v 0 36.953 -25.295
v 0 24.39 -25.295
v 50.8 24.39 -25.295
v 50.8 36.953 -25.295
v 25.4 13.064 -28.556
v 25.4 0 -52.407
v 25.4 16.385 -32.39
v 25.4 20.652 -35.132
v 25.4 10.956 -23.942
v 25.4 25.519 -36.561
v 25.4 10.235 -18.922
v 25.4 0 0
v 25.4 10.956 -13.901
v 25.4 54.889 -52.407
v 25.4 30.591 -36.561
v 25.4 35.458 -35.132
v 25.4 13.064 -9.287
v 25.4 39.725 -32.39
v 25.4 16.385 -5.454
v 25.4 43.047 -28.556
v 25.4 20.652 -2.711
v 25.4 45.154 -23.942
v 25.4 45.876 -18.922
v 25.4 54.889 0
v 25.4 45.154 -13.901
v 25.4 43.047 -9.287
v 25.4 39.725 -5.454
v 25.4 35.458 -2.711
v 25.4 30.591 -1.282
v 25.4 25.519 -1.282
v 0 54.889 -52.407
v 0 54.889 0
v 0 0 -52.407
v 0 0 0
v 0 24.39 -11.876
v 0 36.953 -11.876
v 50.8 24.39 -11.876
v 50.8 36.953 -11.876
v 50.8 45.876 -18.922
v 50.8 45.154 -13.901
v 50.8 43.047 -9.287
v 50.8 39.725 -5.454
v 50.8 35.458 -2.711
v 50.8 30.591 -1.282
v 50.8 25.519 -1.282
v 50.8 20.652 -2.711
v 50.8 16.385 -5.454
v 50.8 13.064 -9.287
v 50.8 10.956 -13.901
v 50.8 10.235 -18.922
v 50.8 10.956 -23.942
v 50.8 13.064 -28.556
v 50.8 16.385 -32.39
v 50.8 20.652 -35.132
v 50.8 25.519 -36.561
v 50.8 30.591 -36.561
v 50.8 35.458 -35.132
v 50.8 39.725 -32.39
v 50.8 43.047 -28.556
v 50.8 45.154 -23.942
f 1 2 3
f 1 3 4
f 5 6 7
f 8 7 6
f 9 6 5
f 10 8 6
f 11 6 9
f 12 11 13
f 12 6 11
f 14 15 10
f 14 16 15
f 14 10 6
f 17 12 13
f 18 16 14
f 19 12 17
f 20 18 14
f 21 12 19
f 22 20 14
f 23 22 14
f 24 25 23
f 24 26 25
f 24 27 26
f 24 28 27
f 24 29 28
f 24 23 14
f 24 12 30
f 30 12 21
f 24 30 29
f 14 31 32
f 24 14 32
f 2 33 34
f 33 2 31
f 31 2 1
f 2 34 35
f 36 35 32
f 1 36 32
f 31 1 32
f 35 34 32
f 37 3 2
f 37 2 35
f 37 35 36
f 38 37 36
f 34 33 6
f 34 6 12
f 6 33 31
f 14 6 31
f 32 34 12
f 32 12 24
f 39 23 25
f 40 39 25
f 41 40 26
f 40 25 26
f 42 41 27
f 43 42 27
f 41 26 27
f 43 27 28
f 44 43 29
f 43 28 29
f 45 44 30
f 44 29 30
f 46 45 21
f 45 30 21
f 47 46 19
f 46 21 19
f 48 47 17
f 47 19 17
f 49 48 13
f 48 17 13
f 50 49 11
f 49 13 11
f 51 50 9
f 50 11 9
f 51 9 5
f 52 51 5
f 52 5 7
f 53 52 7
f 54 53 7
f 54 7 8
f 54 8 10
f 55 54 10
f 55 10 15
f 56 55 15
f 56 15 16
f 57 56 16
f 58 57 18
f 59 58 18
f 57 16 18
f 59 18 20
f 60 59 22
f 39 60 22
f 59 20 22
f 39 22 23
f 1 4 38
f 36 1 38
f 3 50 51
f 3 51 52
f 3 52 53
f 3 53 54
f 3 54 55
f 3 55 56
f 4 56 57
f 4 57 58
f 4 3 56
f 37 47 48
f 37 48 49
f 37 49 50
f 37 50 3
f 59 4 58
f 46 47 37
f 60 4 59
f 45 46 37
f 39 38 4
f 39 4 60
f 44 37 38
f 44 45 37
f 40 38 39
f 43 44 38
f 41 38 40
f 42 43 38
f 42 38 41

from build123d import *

# Parameters (mm, degrees)
F0_W     = 54.889154
F0_H     = 52.407466
F1_DEPTH = 25.4
F2_R     = 17.820704
F3_DEPTH = 25.4
F4_W     = 12.562469
F4_H     = 13.418828
F5_DEPTH = 50.801


with BuildPart() as f1:
    # F0 (on Right) → F1 (new body)
    with BuildSketch(Plane.YZ):
        with Locations((27.444577, -26.203733)):
            Rectangle(F0_W, F0_H)
    extrude(amount=F1_DEPTH)

    # F2 (on face) → F3 (join)
    with BuildSketch(Plane.YZ.offset(25.4)):
        with Locations((28.055245, -18.92175)):
            Circle(F2_R)
    extrude(amount=F3_DEPTH)

    # F4 (on face) → F5 (cut, through all)
    with BuildSketch(Plane.YZ.offset(50.8)):
        with Locations((30.671432, -18.585598)):
            Rectangle(F4_W, F4_H)
    extrude(amount=-F5_DEPTH, mode=Mode.SUBTRACT)


solid = f1.part
